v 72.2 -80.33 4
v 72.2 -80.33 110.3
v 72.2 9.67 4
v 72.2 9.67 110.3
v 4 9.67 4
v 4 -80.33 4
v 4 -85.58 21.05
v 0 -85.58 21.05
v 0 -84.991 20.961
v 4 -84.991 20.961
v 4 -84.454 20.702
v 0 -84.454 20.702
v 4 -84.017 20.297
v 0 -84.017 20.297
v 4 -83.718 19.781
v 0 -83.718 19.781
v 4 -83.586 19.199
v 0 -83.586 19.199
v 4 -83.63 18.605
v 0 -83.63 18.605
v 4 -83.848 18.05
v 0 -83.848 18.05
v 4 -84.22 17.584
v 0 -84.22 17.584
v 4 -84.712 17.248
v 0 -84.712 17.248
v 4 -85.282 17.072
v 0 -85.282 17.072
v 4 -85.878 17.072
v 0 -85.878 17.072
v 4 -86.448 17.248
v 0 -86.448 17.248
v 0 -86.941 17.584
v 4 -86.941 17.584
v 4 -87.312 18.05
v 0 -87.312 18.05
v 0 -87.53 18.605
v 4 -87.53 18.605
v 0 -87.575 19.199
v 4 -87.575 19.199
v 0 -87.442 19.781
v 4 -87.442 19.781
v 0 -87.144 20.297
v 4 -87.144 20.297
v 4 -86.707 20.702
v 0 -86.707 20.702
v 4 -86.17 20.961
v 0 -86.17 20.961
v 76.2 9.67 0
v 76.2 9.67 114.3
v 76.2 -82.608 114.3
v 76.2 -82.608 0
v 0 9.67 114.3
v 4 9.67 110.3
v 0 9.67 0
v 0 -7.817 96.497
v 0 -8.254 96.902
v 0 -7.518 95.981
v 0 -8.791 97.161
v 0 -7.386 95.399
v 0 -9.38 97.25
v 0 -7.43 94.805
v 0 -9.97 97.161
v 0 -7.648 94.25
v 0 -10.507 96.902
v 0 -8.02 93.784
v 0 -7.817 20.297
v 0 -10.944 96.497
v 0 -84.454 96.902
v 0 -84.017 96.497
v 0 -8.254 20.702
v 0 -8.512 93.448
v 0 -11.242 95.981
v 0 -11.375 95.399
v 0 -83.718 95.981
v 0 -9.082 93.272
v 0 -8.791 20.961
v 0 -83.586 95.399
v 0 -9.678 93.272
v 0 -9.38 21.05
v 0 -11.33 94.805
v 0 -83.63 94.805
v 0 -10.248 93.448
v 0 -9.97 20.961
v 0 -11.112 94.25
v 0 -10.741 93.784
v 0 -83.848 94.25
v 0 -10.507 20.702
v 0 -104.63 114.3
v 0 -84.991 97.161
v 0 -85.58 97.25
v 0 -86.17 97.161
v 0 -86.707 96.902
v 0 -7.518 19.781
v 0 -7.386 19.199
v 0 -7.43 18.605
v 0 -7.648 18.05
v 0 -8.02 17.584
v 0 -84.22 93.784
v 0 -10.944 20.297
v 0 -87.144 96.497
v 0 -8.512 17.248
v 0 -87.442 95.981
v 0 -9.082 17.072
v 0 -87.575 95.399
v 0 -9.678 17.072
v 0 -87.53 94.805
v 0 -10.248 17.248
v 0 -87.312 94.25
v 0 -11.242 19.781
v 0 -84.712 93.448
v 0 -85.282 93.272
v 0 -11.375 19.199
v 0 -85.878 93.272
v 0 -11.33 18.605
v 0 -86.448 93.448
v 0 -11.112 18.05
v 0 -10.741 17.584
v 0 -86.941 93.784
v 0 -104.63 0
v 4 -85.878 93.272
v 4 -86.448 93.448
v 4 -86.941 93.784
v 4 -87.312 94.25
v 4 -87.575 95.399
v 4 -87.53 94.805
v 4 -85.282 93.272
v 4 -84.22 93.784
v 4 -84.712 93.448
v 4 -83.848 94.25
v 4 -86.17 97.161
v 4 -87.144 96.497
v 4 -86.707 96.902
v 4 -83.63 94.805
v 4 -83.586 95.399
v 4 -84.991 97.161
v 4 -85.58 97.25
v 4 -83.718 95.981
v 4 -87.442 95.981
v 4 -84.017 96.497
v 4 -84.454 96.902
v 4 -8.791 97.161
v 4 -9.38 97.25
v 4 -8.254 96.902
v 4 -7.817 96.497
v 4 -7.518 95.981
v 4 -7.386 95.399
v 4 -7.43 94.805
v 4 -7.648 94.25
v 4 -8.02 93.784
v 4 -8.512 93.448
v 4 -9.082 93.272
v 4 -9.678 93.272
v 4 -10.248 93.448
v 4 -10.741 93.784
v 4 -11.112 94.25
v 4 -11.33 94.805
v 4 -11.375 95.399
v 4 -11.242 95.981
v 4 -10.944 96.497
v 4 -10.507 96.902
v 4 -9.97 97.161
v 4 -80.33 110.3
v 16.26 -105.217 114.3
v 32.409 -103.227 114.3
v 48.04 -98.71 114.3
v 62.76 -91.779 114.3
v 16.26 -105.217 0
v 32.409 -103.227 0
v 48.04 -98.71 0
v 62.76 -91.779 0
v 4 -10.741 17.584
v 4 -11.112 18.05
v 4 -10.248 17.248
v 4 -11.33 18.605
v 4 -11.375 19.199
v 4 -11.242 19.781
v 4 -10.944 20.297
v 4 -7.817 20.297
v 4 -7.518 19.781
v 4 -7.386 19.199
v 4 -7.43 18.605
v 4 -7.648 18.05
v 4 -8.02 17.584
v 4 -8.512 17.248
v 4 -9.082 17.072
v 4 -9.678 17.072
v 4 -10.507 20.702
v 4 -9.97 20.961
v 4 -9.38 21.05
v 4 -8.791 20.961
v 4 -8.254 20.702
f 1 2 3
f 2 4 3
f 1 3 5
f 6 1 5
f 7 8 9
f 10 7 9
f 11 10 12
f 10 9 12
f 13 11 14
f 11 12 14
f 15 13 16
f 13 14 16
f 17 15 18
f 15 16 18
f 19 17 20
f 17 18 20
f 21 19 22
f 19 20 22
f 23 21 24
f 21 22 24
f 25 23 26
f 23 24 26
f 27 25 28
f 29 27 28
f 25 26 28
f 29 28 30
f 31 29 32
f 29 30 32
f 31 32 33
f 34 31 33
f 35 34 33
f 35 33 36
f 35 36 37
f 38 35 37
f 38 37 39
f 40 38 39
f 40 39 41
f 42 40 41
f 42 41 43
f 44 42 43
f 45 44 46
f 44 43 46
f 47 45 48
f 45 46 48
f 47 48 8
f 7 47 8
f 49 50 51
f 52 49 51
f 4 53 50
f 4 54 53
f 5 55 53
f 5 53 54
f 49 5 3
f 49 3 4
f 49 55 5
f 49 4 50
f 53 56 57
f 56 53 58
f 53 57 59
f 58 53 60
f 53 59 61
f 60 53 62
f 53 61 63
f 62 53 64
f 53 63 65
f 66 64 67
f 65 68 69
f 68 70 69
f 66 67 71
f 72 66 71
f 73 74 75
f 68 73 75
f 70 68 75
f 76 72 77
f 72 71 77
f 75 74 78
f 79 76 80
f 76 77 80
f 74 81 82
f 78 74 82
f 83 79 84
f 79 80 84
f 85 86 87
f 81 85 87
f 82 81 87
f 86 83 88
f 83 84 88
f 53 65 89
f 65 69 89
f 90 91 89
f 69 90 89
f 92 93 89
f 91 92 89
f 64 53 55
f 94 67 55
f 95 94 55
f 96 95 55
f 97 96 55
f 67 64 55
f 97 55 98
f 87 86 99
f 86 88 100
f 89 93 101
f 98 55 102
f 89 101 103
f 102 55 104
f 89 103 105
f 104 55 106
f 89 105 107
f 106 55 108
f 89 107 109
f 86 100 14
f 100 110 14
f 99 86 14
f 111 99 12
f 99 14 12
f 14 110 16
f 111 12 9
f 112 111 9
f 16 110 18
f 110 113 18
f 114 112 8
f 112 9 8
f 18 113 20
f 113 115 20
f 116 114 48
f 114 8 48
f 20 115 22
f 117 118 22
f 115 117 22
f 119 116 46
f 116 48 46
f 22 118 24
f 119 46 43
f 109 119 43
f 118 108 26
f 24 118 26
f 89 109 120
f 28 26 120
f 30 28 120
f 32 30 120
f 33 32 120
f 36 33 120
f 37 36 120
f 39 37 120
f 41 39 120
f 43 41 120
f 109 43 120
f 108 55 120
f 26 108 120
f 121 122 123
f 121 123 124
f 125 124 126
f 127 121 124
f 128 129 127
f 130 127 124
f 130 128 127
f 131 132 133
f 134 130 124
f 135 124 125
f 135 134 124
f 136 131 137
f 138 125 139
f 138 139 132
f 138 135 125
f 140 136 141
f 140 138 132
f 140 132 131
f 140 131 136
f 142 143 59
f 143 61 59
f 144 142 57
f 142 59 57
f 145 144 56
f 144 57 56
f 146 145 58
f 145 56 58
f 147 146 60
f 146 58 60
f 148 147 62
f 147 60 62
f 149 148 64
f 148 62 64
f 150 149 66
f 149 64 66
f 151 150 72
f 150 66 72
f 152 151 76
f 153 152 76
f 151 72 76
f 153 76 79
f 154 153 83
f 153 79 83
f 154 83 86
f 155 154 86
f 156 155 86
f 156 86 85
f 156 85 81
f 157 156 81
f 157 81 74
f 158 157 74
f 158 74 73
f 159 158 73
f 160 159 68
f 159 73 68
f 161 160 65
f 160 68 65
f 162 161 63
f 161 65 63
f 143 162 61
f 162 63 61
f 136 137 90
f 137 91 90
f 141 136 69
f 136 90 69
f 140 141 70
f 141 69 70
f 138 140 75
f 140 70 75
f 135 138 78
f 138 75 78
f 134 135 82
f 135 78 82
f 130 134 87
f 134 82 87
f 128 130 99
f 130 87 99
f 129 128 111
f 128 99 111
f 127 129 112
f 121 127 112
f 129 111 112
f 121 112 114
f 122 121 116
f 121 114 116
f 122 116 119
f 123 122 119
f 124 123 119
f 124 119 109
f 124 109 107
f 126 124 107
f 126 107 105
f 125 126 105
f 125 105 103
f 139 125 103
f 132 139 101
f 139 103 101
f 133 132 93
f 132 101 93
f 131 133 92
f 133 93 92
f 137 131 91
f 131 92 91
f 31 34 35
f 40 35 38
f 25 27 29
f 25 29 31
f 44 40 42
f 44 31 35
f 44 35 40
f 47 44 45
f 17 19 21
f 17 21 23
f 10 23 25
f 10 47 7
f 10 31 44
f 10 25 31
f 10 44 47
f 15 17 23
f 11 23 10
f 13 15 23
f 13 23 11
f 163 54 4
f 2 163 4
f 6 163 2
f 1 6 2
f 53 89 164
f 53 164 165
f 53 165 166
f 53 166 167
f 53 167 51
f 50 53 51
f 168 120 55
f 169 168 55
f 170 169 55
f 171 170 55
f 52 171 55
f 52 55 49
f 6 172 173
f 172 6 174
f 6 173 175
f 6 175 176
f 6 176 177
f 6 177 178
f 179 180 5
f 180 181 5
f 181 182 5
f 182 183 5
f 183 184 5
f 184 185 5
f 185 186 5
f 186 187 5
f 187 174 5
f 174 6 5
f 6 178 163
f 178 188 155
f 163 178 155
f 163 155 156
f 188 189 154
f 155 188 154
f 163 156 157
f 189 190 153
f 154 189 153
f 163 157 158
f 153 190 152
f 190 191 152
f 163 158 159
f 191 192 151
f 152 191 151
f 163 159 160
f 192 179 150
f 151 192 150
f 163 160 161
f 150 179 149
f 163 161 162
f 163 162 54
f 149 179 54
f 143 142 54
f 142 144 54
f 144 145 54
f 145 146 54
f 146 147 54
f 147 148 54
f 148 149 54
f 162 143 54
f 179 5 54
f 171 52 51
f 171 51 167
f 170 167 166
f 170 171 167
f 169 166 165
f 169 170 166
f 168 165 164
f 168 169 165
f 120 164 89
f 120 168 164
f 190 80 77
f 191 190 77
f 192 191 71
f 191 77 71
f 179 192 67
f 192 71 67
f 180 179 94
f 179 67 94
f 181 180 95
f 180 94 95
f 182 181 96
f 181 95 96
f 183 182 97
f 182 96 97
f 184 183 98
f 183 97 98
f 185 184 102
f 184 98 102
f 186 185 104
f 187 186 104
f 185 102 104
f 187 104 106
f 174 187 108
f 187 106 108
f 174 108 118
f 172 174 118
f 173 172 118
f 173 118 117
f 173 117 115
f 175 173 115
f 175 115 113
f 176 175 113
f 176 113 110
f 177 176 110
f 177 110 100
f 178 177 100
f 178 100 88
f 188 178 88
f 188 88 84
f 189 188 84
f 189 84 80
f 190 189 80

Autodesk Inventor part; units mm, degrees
ref_plane "YZ Plane" through (0, 0, 0) normal (1, 0, 0) x (0, 1, 0)
ref_plane "XZ Plane" through (0, 0, 0) normal (0, 1, 0) x (-1, 0, 0)
ref_plane "XY Plane" through (0, 0, 0) normal (0, 0, 1) x (1, 0, 0)
sketch "Sketch1" plane through (0, 0, 0) normal (0, 0, 1) x (1, 0, 0)
  line L0 (0, 9.6698) -> (0, -104.6302)
  line L1 (0, 9.6698) -> (76.2, 9.6698)
  line L2 (76.2, 9.6698) -> (76.2, -82.6078)
  arc A0 (0, -104.6302) -> (76.2, -82.6078) centre (11.8217, -2.6932) ccw
  point P0 (0, 0)
  dimension "d0" = 114.3
  dimension "d1" = 76.2
extrude "Extrusion1" add sketch "Sketch1" along normal blind 114.3
sketch "Sketch2" plane through (0, 9.6698, 0) normal (0, 1, 0) x (1, 0, 0)
  line L0 (72.2, -4) -> (4, -4)
  line L1 (4, -4) -> (4, -110.3)
  line L2 (4, -110.3) -> (72.2, -110.3)
  line L3 (72.2, -110.3) -> (72.2, -4)
  line L4 (76.2, -114.3) -> (0, -114.3) projected
  line L5 (76.2, 0) -> (0, 0) projected
  line L6 (76.2, 0) -> (76.2, -114.3) projected
  line L7 (0, 0) -> (0, -114.3) projected
  dimension "d4" = 4
  dimension "d5" = 4
  dimension "d6" = 4
  dimension "d7" = 4
extrude "Extrusion2" cut sketch "Sketch2" against normal blind 90 contours L3 L2 L1 L0
sketch "Sketch3" plane through (0, -104.6302, 0) normal (-1, 0, 0) x (0, 0, 1)
  circle A0 centre (19.05, 95.25) radius 2
  circle A1 centre (95.25, 95.25) radius 2
  circle A2 centre (19.05, 19.05) radius 2
  circle A3 centre (95.25, 19.05) radius 2
  line L0 (0, 114.3) -> (114.3, 114.3) projected
  line L1 (0, 114.3) -> (0, 0) projected
  line L2 (114.3, 114.3) -> (114.3, 0) projected
  line L3 (0, 0) -> (114.3, 0) projected
  point P0 (0, 104.6302)
  dimension "d10" = 4
  dimension "d11" = 4
  dimension "d12" = 4
  dimension "d13" = 4
  dimension "d14" = 19.05
  dimension "d15" = 19.05
  dimension "d16" = 19.05
  dimension "d17" = 19.05
  dimension "d18" = 19.05
  dimension "d19" = 19.05
  dimension "d20" = 19.05
  dimension "d21" = 19.05
extrude "Extrusion3" cut sketch "Sketch3" against normal blind 4 contours A0 | A1 | A2 | A3
equation "\"d22\" = d12"
properties part number "ashish1" material "PBT Plastic"
